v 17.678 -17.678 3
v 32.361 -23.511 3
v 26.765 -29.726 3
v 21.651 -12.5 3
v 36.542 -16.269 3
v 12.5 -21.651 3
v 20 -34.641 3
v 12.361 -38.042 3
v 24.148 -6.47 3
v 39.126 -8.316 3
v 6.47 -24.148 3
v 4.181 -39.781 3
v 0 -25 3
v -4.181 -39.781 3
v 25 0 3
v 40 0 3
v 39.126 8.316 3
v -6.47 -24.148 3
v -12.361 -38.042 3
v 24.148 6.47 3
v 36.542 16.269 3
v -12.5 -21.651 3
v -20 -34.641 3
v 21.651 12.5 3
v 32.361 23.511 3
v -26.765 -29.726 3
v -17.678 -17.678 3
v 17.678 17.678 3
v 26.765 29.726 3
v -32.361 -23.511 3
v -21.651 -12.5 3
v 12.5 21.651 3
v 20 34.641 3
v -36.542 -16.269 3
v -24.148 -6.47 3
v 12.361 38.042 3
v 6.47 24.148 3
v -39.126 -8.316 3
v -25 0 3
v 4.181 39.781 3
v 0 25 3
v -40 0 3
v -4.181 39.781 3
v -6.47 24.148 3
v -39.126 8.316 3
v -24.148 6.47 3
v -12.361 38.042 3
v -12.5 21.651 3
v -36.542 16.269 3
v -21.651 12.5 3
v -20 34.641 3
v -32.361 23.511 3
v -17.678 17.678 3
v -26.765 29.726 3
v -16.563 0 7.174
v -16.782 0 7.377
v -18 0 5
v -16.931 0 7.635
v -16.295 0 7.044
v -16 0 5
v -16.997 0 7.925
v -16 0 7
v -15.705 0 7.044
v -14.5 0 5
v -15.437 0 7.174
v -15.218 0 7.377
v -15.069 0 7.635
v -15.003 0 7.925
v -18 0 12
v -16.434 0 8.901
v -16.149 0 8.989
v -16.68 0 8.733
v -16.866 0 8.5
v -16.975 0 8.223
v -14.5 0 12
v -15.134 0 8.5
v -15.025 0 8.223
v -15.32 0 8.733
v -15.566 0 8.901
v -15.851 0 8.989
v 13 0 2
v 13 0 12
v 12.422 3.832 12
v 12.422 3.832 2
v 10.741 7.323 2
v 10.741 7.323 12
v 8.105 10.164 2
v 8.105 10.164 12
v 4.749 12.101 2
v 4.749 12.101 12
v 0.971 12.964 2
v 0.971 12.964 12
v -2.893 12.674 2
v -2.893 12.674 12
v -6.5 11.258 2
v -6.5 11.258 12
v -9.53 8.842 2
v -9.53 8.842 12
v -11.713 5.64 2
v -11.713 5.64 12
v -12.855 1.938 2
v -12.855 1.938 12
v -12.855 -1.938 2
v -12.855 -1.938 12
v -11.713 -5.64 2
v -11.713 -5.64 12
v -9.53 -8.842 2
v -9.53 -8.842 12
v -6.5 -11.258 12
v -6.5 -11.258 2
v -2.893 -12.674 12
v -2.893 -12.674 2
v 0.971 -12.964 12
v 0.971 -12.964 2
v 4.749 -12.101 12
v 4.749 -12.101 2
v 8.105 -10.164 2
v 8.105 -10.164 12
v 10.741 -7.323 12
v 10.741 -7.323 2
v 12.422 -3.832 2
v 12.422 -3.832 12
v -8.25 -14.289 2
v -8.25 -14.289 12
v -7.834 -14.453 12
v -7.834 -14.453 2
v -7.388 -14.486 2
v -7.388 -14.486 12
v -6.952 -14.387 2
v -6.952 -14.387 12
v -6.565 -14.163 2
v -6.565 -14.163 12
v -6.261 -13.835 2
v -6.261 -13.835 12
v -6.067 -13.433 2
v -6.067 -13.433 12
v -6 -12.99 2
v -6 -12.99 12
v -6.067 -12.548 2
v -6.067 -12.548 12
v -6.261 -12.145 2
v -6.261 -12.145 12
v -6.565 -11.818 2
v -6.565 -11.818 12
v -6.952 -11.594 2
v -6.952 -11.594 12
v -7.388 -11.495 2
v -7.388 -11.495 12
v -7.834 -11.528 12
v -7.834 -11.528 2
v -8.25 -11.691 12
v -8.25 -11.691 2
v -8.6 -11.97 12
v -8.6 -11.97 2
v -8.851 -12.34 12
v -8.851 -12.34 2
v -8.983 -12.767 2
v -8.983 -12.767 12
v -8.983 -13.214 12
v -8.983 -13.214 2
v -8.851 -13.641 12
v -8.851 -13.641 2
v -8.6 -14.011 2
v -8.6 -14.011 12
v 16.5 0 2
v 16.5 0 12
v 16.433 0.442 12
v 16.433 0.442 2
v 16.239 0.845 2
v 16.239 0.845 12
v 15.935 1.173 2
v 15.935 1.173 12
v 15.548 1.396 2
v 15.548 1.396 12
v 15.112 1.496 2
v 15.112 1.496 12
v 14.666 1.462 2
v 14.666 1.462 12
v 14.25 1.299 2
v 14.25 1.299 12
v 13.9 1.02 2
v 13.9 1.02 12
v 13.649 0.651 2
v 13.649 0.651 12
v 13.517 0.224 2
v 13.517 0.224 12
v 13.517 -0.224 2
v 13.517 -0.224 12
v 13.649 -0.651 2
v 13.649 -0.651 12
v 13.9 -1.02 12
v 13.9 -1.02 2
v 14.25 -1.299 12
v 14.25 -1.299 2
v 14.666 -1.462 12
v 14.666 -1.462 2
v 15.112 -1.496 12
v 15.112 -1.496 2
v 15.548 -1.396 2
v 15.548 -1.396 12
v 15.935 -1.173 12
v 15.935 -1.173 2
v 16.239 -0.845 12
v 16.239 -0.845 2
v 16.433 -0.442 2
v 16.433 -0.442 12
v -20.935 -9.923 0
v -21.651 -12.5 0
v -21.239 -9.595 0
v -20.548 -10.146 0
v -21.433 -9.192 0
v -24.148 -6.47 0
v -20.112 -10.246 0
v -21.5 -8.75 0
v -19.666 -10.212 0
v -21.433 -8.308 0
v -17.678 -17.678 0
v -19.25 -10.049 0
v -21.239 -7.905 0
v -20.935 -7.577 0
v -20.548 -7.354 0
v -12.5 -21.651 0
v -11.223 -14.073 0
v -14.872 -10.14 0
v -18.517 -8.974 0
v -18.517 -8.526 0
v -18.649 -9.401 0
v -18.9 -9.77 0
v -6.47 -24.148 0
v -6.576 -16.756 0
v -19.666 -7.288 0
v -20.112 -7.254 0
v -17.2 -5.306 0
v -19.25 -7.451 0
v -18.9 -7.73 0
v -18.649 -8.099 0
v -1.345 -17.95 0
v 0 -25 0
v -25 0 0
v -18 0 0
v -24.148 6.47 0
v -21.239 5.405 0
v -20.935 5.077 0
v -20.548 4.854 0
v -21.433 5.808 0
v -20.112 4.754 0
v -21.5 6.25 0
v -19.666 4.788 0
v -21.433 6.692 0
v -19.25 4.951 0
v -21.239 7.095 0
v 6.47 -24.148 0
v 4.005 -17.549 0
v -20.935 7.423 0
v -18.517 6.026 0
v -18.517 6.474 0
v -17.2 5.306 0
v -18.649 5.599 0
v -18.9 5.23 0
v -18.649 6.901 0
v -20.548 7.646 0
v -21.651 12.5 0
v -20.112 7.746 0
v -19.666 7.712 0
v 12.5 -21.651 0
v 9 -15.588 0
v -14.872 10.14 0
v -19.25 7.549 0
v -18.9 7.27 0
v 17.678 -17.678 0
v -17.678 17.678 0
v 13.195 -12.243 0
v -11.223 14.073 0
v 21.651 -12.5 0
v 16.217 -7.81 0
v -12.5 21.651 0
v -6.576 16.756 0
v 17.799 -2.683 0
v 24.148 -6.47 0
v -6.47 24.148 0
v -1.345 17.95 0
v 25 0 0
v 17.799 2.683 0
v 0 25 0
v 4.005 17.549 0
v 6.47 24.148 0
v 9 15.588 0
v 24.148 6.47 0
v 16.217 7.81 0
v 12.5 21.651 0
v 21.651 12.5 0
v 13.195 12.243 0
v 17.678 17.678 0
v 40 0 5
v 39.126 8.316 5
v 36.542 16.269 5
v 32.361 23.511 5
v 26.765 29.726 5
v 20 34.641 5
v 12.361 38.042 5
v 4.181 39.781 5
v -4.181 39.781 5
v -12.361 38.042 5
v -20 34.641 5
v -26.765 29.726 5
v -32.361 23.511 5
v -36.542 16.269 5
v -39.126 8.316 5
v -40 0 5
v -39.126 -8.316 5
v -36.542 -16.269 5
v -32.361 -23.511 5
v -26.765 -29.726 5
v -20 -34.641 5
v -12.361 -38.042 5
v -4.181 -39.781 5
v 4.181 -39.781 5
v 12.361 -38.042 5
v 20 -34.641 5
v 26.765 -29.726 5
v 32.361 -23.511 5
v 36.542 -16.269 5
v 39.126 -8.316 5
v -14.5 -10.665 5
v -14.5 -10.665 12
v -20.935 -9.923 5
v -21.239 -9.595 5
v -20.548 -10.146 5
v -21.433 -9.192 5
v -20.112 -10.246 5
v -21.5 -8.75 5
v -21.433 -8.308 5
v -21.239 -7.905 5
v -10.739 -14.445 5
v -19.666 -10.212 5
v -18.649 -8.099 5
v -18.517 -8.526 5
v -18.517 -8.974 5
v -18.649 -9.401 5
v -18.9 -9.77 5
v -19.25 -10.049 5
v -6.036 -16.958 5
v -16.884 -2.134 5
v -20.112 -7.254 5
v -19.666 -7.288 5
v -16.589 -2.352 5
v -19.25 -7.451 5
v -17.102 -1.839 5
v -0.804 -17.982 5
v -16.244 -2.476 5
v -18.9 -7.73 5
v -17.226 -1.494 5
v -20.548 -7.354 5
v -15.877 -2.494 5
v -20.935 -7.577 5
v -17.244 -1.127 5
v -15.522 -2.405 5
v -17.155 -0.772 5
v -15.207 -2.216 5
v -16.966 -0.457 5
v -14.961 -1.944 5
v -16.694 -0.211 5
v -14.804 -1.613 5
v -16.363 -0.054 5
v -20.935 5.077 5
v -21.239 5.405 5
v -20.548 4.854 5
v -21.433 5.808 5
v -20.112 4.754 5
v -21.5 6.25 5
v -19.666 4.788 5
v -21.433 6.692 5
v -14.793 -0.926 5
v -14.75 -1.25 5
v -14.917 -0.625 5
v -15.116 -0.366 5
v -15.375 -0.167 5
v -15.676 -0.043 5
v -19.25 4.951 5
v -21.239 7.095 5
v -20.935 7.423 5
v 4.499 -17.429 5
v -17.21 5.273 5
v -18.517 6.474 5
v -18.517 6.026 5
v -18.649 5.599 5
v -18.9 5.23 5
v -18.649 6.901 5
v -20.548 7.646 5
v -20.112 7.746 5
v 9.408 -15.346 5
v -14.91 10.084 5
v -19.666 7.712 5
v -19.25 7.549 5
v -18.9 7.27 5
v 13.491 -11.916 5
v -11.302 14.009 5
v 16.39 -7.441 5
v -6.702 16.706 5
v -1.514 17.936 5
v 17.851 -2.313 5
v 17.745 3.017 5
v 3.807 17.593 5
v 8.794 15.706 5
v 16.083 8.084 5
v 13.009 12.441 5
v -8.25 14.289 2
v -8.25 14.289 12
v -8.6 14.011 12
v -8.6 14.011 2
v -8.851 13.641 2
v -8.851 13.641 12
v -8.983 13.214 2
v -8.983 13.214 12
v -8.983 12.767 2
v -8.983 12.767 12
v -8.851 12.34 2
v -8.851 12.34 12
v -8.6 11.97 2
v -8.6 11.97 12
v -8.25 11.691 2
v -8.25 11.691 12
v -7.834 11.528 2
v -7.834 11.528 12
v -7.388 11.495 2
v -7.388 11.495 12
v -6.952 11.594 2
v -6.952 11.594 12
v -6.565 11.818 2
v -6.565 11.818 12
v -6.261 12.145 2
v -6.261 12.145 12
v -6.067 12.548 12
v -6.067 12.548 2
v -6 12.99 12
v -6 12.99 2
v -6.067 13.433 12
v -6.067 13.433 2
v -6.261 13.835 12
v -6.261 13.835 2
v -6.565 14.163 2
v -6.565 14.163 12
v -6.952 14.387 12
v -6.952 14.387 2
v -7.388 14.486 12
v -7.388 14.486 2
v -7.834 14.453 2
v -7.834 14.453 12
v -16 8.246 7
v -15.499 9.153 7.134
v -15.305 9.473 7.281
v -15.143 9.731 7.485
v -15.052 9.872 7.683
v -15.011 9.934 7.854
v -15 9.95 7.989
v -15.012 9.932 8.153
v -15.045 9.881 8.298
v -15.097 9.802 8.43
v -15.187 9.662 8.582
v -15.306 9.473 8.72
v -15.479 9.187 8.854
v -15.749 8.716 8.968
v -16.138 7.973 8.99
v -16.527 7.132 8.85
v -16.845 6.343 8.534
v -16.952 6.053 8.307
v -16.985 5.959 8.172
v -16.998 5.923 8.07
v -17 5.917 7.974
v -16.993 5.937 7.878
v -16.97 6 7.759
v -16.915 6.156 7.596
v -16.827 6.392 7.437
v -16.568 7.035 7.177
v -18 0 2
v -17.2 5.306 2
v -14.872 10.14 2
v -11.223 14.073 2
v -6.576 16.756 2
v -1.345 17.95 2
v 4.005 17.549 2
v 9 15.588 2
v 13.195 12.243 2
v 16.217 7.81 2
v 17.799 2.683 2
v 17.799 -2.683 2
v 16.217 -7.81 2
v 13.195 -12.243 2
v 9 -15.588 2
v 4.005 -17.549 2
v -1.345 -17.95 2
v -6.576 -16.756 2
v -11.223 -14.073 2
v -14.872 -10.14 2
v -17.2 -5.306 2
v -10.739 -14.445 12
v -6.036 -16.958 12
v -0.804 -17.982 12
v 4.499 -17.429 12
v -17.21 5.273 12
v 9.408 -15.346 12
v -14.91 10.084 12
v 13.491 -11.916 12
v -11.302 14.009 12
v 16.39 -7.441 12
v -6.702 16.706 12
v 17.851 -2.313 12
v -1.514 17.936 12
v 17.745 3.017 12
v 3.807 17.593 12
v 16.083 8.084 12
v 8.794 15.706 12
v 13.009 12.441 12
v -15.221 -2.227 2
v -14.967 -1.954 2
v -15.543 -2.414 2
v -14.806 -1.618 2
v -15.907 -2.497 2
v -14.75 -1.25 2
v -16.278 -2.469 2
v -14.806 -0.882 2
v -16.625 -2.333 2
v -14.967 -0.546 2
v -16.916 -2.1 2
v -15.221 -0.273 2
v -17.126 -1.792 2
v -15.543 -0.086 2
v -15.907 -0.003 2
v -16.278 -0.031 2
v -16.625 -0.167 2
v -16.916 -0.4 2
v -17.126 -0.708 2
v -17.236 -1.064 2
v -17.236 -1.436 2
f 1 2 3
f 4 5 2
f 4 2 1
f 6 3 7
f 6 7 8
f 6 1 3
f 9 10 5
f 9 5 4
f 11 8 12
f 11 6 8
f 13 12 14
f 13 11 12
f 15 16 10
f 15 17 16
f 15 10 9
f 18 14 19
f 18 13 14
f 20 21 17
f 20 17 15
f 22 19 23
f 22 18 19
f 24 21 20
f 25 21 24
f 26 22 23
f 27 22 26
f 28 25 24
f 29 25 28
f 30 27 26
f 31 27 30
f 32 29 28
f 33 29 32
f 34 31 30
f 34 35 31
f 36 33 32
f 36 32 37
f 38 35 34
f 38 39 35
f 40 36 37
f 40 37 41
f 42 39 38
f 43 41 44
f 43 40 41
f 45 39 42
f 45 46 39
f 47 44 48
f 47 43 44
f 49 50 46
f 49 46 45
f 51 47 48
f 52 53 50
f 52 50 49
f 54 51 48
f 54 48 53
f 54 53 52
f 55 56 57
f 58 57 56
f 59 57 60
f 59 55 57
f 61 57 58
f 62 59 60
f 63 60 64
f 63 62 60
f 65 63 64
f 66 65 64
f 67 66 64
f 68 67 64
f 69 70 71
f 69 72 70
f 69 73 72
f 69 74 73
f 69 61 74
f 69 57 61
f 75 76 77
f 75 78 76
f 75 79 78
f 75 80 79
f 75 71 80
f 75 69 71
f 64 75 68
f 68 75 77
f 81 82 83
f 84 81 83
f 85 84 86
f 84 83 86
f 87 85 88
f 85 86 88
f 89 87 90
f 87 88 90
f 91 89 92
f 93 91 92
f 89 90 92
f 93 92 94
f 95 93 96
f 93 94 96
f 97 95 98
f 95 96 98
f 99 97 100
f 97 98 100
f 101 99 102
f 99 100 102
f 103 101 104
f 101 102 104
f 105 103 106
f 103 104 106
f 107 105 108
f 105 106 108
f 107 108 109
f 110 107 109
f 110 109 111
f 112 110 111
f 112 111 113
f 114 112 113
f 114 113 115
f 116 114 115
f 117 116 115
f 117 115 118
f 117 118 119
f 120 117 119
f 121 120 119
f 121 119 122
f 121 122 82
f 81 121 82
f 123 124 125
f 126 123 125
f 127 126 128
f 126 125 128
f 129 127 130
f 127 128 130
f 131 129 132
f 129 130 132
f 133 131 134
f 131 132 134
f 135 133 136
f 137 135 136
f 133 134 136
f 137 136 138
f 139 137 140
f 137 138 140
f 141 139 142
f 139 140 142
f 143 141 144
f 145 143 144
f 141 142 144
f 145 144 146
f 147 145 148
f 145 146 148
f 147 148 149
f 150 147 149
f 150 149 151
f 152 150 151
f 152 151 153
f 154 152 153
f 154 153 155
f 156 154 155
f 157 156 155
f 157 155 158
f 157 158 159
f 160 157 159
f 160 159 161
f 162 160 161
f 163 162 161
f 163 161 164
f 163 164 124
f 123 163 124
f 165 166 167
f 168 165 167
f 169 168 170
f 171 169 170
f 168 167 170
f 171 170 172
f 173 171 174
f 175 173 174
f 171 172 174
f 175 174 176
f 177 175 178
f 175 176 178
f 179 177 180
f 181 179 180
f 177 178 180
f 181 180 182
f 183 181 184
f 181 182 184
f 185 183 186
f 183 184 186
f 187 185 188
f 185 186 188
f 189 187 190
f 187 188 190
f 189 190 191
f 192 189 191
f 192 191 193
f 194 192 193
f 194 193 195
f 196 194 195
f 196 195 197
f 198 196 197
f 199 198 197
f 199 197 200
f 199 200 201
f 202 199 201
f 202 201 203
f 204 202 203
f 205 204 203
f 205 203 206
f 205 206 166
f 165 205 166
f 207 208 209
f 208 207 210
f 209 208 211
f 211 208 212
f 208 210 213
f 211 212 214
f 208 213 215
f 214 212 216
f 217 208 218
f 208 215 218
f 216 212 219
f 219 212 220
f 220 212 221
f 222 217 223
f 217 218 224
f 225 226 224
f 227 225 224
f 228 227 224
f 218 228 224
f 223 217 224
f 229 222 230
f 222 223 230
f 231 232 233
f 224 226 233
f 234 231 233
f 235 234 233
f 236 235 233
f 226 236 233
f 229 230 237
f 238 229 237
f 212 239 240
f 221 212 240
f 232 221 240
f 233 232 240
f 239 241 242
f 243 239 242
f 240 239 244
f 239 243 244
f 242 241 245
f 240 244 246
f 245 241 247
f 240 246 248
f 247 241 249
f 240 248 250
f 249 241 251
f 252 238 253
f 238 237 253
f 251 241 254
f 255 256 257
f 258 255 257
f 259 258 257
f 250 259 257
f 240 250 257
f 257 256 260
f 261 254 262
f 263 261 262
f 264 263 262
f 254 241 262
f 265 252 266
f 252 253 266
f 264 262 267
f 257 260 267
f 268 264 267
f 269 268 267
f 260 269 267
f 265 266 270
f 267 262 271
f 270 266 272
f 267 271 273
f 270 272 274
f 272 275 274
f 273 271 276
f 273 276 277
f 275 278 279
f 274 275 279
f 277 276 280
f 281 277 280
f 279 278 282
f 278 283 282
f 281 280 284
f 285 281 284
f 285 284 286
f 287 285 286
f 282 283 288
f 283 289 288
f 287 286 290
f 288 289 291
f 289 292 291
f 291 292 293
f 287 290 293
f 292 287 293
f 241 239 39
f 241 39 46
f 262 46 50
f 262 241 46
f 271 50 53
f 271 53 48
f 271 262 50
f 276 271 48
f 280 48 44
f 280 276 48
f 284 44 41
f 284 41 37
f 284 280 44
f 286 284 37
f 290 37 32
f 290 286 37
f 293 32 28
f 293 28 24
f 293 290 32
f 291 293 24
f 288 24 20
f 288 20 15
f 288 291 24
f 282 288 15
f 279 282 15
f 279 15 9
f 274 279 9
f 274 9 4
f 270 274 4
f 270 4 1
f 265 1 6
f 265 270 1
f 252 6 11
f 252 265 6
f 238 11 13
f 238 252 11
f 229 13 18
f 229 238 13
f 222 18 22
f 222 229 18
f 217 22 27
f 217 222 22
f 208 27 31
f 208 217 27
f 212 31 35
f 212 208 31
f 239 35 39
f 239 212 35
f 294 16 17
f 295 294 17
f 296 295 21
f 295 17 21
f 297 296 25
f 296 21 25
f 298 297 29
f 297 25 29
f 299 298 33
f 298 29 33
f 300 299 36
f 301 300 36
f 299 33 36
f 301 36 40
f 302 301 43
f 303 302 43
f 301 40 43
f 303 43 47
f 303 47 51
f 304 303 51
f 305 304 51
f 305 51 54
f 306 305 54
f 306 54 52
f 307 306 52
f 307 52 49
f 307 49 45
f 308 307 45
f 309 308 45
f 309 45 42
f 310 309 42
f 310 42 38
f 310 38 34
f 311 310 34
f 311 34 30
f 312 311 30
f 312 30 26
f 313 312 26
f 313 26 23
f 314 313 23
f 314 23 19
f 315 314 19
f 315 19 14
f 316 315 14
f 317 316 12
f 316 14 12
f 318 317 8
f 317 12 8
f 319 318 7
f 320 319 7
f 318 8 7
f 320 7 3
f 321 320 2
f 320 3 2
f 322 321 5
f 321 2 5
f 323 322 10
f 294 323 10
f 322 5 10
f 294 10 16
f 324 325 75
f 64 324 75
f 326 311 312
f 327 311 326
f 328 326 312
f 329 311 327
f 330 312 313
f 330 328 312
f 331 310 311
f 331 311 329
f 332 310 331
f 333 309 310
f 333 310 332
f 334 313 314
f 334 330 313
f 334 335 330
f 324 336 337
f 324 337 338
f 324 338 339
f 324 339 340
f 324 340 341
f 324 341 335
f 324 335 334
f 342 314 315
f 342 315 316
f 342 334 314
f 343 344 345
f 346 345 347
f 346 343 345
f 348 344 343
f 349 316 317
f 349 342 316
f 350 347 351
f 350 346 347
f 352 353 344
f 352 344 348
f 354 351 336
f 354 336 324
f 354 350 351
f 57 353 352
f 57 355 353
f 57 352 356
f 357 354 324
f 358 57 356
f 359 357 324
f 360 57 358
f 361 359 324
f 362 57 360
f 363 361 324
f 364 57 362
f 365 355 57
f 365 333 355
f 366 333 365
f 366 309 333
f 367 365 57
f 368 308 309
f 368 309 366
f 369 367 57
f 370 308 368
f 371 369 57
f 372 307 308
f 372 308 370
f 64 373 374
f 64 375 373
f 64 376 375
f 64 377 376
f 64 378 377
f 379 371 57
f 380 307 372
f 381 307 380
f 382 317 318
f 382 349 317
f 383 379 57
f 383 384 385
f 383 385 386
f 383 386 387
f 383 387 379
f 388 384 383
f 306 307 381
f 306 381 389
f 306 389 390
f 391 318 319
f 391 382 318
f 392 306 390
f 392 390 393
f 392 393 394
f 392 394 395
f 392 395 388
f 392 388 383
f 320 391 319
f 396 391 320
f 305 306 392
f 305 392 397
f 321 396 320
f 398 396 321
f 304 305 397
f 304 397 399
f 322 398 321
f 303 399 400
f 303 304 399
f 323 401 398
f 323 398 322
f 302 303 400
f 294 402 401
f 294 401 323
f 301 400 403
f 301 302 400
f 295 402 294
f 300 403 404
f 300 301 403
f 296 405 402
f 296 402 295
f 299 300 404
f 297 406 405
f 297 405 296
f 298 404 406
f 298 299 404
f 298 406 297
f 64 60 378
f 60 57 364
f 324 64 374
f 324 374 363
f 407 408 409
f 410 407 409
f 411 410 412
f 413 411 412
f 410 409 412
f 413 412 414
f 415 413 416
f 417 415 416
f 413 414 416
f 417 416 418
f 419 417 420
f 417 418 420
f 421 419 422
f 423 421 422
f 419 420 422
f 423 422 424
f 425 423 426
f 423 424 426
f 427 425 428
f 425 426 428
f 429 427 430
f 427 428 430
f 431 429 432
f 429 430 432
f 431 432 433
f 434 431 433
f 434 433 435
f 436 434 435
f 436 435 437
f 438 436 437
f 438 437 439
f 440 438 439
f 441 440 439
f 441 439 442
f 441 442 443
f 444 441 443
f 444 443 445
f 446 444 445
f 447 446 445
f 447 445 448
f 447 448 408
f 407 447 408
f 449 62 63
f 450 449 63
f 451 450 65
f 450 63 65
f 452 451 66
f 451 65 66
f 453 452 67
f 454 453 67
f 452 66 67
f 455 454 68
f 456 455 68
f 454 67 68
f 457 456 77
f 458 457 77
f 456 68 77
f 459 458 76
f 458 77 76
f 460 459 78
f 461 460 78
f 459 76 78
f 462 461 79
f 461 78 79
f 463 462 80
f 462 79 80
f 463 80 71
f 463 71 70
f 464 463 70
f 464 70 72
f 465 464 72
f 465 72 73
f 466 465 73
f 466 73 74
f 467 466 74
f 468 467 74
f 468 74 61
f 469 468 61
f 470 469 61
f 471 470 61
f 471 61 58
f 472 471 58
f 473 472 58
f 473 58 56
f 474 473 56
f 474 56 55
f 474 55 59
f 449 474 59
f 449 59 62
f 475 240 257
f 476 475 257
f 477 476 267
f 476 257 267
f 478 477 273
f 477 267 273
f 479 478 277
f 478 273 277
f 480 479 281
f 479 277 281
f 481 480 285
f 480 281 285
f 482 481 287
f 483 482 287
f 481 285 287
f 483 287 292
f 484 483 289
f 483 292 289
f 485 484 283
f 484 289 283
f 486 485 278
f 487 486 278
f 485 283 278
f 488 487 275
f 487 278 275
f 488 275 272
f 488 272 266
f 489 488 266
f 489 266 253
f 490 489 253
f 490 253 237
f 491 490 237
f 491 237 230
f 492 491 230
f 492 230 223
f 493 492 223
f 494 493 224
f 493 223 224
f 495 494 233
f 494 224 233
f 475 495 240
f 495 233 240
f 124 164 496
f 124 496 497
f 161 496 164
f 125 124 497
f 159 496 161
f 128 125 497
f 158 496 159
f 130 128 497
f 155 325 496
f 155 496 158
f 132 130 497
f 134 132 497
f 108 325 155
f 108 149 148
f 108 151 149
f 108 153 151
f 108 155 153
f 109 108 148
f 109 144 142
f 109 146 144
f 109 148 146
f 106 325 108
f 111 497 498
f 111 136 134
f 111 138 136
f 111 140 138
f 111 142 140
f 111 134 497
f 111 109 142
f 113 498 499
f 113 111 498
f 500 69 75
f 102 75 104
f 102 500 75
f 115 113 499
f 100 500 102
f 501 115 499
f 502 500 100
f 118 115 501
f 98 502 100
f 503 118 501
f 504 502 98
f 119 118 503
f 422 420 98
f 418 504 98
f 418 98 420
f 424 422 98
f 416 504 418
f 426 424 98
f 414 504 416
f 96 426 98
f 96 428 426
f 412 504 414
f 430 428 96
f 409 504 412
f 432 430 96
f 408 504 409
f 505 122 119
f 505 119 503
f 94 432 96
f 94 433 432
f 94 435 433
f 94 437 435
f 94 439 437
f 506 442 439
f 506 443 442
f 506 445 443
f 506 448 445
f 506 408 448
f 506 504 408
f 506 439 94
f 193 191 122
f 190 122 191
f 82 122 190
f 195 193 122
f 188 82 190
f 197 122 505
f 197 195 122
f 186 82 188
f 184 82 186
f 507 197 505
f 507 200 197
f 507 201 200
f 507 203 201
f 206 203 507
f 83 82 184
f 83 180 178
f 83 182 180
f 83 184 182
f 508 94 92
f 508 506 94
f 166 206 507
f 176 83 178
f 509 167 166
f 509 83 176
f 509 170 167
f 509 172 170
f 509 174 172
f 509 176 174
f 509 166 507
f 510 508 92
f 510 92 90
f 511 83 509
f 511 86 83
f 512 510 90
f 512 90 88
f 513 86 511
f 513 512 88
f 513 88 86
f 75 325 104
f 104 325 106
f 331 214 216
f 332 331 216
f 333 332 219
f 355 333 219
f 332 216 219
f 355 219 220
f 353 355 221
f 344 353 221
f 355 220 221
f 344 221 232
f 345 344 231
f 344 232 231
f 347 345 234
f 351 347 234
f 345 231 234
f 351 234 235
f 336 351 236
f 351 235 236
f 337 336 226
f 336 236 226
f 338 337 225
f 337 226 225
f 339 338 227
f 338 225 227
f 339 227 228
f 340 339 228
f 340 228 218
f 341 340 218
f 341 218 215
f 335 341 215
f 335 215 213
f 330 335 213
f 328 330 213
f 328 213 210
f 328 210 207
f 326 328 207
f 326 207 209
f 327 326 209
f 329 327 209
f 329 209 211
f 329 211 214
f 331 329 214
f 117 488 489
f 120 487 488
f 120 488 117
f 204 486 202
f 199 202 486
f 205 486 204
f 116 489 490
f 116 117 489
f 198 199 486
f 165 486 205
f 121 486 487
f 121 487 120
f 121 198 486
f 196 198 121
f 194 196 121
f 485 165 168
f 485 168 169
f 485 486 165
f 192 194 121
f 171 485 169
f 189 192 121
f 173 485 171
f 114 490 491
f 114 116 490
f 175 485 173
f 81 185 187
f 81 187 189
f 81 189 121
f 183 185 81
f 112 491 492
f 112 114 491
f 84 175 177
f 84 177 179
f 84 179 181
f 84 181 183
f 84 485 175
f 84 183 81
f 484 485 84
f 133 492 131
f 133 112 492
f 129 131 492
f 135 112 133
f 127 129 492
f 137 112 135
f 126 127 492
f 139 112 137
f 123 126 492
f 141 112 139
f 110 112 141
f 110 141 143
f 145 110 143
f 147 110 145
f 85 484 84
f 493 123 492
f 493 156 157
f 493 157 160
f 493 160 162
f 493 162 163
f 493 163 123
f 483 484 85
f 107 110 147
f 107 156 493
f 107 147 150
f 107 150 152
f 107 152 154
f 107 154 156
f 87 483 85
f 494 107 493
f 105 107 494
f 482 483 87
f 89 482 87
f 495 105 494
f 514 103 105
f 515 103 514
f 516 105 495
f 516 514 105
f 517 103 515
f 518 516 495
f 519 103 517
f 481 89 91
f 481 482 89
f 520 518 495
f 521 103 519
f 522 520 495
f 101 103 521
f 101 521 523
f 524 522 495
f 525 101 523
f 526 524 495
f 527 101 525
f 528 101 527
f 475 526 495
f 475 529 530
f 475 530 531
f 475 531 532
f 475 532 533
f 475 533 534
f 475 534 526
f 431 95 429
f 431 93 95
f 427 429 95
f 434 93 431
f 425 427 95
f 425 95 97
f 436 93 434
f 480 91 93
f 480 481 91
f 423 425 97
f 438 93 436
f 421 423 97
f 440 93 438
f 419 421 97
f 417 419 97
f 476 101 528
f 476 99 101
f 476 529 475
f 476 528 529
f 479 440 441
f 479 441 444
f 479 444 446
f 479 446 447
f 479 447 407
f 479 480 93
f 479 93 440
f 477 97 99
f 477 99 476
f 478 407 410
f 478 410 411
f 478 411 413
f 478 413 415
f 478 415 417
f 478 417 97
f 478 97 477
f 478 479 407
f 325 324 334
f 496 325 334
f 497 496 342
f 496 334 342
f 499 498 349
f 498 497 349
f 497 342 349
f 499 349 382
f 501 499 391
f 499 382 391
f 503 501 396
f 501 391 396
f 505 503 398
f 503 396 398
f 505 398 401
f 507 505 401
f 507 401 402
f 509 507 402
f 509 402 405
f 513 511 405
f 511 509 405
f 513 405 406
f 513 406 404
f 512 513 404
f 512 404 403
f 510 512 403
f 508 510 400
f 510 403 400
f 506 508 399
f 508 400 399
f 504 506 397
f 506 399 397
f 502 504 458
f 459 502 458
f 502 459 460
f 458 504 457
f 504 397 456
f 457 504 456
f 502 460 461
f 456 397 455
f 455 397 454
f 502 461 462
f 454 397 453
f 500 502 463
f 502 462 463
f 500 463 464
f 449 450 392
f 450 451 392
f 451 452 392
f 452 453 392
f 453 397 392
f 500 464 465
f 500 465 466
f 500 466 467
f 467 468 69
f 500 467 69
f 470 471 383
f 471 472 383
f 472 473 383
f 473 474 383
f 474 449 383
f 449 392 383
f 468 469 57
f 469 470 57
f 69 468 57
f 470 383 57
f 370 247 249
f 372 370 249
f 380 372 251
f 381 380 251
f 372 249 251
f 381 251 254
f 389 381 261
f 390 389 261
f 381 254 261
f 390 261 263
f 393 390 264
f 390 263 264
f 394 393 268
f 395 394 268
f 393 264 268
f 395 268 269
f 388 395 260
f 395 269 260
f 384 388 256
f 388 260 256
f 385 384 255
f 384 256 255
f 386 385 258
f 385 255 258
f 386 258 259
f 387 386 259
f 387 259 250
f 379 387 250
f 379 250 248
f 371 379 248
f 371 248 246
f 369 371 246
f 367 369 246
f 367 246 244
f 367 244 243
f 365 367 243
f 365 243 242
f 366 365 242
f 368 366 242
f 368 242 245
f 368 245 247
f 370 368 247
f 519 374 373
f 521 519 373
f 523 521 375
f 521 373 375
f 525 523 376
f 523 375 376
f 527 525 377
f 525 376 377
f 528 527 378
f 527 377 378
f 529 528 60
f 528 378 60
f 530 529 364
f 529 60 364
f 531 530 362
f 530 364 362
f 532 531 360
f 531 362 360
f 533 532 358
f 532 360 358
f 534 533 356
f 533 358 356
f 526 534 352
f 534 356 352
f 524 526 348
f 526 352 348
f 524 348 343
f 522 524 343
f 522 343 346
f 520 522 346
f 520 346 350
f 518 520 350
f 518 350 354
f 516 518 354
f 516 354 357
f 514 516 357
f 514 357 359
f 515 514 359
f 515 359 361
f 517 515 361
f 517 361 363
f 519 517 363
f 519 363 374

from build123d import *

# Parameters (mm, degrees)
SKETCH1_R           = 40
BOSS_EXTRUDE1_DEPTH = 5
SKETCH2_R           = 18
BOSS_EXTRUDE2_DEPTH = 7
CUT_EXTRUDE1_REACH  = 59.827
SKETCH3_R           = 13
SKETCH5_W           = 3.5
SKETCH5_H           = 10.665364504
CUT_EXTRUDE3_DEPTH  = 7
SKETCH6_R           = 1.25
CUT_EXTRUDE4_DEPTH  = 58
SKETCH8_R           = 1.5
CUT_EXTRUDE5_DEPTH  = 58.827329179
CIRPATTERN1_COUNT   = 3
SKETCH10_R          = 1.5
CUT_EXTRUDE6_DEPTH  = 58.827329179
SKETCH11_OUTSIDE_W  = 104.754
SKETCH11_OUTSIDE_H  = 104.754
SKETCH11_OUTSIDE_R  = 25
CUT_EXTRUDE8_DEPTH  = 3
SKETCH12_R          = 18
CUT_EXTRUDE9_DEPTH  = 2
SKETCH13_R          = 1
CUT_EXTRUDE10_DEPTH = 58.827329179


with BuildPart() as part:
    # Sketch1 → Boss-Extrude1 (new body)
    with BuildSketch(Plane.XY):
        Circle(SKETCH1_R)
    extrude(amount=BOSS_EXTRUDE1_DEPTH)

    # Sketch2 → Boss-Extrude2 (add)
    with BuildSketch(Plane.XY.offset(5)):
        Circle(SKETCH2_R)
    extrude(amount=BOSS_EXTRUDE2_DEPTH)

    # Sketch3 → Cut-Extrude1 (cut, up to next)
    with BuildSketch(Plane.XY.offset(12), mode=Mode.PRIVATE) as cut_extrude1_sk1:
        Circle(SKETCH3_R)
    cut_extrude1_tool1 = extrude(cut_extrude1_sk1.sketch, amount=-CUT_EXTRUDE1_REACH, mode=Mode.PRIVATE) & part.part
    add(cut_extrude1_tool1.solids().sort_by_distance((0, 0, 12))[0], mode=Mode.SUBTRACT)

    # Sketch5 → Cut-Extrude3 (cut)
    with BuildSketch(Plane.XY.offset(12)):
        with Locations((-16.25, -5.332682252)):
            Rectangle(SKETCH5_W, SKETCH5_H)
    extrude(amount=-CUT_EXTRUDE3_DEPTH, mode=Mode.SUBTRACT)

    # Sketch6 → Cut-Extrude4 (cut, through all)
    with BuildSketch(Plane.XY.offset(5)):
        with Locations((-16, -1.25)):
            Circle(SKETCH6_R)
    extrude(amount=-CUT_EXTRUDE4_DEPTH, mode=Mode.SUBTRACT)

    # Sketch8 → Cut-Extrude5 (cut, through all)
    with BuildSketch(Plane.XY.offset(12)):
        with Locations((15, 0)):
            Circle(SKETCH8_R)
    cut_extrude5 = extrude(amount=-CUT_EXTRUDE5_DEPTH, mode=Mode.SUBTRACT)

    # CirPattern1: Cut-Extrude5 ×3 about axis
    cirpattern1_axis = Axis((0, 0, 0), (0, 0, 1))
    for i in range(1, CIRPATTERN1_COUNT):
        add(cut_extrude5.rotate(cirpattern1_axis, i * 360 / CIRPATTERN1_COUNT), mode=Mode.SUBTRACT)

    # Sketch10 → Cut-Extrude6 (cut, through all)
    with BuildSketch(Plane(origin=(0, 0, 0), x_dir=(-1, 0, 0), z_dir=(0, 0, -1))):
        with Locations((20, 6.25)):
            Circle(SKETCH10_R)
        with Locations((20, -8.75)):
            Circle(SKETCH10_R)
    extrude(amount=-CUT_EXTRUDE6_DEPTH, mode=Mode.SUBTRACT)

    # Sketch11 outside → Cut-Extrude8 (cut)
    with BuildSketch(Plane(origin=(0, 0, 0), x_dir=(-1, 0, 0), z_dir=(0, 0, -1))):
        Rectangle(SKETCH11_OUTSIDE_W, SKETCH11_OUTSIDE_H)
        Circle(SKETCH11_OUTSIDE_R, mode=Mode.SUBTRACT)
    extrude(amount=-CUT_EXTRUDE8_DEPTH, mode=Mode.SUBTRACT)

    # Sketch12 → Cut-Extrude9 (cut)
    with BuildSketch(Plane(origin=(0, 0, 0), x_dir=(-1, 0, 0), z_dir=(0, 0, -1))):
        Circle(SKETCH12_R)
    extrude(amount=-CUT_EXTRUDE9_DEPTH, mode=Mode.SUBTRACT)

    # Sketch13 → Cut-Extrude10 (cut, through all)
    with BuildSketch(Plane.XZ):
        with Locations(Location((-16, 8, 0), (0, 0, 270))):
            Circle(SKETCH13_R)
    extrude(amount=-CUT_EXTRUDE10_DEPTH, mode=Mode.SUBTRACT)


solid = part.part
